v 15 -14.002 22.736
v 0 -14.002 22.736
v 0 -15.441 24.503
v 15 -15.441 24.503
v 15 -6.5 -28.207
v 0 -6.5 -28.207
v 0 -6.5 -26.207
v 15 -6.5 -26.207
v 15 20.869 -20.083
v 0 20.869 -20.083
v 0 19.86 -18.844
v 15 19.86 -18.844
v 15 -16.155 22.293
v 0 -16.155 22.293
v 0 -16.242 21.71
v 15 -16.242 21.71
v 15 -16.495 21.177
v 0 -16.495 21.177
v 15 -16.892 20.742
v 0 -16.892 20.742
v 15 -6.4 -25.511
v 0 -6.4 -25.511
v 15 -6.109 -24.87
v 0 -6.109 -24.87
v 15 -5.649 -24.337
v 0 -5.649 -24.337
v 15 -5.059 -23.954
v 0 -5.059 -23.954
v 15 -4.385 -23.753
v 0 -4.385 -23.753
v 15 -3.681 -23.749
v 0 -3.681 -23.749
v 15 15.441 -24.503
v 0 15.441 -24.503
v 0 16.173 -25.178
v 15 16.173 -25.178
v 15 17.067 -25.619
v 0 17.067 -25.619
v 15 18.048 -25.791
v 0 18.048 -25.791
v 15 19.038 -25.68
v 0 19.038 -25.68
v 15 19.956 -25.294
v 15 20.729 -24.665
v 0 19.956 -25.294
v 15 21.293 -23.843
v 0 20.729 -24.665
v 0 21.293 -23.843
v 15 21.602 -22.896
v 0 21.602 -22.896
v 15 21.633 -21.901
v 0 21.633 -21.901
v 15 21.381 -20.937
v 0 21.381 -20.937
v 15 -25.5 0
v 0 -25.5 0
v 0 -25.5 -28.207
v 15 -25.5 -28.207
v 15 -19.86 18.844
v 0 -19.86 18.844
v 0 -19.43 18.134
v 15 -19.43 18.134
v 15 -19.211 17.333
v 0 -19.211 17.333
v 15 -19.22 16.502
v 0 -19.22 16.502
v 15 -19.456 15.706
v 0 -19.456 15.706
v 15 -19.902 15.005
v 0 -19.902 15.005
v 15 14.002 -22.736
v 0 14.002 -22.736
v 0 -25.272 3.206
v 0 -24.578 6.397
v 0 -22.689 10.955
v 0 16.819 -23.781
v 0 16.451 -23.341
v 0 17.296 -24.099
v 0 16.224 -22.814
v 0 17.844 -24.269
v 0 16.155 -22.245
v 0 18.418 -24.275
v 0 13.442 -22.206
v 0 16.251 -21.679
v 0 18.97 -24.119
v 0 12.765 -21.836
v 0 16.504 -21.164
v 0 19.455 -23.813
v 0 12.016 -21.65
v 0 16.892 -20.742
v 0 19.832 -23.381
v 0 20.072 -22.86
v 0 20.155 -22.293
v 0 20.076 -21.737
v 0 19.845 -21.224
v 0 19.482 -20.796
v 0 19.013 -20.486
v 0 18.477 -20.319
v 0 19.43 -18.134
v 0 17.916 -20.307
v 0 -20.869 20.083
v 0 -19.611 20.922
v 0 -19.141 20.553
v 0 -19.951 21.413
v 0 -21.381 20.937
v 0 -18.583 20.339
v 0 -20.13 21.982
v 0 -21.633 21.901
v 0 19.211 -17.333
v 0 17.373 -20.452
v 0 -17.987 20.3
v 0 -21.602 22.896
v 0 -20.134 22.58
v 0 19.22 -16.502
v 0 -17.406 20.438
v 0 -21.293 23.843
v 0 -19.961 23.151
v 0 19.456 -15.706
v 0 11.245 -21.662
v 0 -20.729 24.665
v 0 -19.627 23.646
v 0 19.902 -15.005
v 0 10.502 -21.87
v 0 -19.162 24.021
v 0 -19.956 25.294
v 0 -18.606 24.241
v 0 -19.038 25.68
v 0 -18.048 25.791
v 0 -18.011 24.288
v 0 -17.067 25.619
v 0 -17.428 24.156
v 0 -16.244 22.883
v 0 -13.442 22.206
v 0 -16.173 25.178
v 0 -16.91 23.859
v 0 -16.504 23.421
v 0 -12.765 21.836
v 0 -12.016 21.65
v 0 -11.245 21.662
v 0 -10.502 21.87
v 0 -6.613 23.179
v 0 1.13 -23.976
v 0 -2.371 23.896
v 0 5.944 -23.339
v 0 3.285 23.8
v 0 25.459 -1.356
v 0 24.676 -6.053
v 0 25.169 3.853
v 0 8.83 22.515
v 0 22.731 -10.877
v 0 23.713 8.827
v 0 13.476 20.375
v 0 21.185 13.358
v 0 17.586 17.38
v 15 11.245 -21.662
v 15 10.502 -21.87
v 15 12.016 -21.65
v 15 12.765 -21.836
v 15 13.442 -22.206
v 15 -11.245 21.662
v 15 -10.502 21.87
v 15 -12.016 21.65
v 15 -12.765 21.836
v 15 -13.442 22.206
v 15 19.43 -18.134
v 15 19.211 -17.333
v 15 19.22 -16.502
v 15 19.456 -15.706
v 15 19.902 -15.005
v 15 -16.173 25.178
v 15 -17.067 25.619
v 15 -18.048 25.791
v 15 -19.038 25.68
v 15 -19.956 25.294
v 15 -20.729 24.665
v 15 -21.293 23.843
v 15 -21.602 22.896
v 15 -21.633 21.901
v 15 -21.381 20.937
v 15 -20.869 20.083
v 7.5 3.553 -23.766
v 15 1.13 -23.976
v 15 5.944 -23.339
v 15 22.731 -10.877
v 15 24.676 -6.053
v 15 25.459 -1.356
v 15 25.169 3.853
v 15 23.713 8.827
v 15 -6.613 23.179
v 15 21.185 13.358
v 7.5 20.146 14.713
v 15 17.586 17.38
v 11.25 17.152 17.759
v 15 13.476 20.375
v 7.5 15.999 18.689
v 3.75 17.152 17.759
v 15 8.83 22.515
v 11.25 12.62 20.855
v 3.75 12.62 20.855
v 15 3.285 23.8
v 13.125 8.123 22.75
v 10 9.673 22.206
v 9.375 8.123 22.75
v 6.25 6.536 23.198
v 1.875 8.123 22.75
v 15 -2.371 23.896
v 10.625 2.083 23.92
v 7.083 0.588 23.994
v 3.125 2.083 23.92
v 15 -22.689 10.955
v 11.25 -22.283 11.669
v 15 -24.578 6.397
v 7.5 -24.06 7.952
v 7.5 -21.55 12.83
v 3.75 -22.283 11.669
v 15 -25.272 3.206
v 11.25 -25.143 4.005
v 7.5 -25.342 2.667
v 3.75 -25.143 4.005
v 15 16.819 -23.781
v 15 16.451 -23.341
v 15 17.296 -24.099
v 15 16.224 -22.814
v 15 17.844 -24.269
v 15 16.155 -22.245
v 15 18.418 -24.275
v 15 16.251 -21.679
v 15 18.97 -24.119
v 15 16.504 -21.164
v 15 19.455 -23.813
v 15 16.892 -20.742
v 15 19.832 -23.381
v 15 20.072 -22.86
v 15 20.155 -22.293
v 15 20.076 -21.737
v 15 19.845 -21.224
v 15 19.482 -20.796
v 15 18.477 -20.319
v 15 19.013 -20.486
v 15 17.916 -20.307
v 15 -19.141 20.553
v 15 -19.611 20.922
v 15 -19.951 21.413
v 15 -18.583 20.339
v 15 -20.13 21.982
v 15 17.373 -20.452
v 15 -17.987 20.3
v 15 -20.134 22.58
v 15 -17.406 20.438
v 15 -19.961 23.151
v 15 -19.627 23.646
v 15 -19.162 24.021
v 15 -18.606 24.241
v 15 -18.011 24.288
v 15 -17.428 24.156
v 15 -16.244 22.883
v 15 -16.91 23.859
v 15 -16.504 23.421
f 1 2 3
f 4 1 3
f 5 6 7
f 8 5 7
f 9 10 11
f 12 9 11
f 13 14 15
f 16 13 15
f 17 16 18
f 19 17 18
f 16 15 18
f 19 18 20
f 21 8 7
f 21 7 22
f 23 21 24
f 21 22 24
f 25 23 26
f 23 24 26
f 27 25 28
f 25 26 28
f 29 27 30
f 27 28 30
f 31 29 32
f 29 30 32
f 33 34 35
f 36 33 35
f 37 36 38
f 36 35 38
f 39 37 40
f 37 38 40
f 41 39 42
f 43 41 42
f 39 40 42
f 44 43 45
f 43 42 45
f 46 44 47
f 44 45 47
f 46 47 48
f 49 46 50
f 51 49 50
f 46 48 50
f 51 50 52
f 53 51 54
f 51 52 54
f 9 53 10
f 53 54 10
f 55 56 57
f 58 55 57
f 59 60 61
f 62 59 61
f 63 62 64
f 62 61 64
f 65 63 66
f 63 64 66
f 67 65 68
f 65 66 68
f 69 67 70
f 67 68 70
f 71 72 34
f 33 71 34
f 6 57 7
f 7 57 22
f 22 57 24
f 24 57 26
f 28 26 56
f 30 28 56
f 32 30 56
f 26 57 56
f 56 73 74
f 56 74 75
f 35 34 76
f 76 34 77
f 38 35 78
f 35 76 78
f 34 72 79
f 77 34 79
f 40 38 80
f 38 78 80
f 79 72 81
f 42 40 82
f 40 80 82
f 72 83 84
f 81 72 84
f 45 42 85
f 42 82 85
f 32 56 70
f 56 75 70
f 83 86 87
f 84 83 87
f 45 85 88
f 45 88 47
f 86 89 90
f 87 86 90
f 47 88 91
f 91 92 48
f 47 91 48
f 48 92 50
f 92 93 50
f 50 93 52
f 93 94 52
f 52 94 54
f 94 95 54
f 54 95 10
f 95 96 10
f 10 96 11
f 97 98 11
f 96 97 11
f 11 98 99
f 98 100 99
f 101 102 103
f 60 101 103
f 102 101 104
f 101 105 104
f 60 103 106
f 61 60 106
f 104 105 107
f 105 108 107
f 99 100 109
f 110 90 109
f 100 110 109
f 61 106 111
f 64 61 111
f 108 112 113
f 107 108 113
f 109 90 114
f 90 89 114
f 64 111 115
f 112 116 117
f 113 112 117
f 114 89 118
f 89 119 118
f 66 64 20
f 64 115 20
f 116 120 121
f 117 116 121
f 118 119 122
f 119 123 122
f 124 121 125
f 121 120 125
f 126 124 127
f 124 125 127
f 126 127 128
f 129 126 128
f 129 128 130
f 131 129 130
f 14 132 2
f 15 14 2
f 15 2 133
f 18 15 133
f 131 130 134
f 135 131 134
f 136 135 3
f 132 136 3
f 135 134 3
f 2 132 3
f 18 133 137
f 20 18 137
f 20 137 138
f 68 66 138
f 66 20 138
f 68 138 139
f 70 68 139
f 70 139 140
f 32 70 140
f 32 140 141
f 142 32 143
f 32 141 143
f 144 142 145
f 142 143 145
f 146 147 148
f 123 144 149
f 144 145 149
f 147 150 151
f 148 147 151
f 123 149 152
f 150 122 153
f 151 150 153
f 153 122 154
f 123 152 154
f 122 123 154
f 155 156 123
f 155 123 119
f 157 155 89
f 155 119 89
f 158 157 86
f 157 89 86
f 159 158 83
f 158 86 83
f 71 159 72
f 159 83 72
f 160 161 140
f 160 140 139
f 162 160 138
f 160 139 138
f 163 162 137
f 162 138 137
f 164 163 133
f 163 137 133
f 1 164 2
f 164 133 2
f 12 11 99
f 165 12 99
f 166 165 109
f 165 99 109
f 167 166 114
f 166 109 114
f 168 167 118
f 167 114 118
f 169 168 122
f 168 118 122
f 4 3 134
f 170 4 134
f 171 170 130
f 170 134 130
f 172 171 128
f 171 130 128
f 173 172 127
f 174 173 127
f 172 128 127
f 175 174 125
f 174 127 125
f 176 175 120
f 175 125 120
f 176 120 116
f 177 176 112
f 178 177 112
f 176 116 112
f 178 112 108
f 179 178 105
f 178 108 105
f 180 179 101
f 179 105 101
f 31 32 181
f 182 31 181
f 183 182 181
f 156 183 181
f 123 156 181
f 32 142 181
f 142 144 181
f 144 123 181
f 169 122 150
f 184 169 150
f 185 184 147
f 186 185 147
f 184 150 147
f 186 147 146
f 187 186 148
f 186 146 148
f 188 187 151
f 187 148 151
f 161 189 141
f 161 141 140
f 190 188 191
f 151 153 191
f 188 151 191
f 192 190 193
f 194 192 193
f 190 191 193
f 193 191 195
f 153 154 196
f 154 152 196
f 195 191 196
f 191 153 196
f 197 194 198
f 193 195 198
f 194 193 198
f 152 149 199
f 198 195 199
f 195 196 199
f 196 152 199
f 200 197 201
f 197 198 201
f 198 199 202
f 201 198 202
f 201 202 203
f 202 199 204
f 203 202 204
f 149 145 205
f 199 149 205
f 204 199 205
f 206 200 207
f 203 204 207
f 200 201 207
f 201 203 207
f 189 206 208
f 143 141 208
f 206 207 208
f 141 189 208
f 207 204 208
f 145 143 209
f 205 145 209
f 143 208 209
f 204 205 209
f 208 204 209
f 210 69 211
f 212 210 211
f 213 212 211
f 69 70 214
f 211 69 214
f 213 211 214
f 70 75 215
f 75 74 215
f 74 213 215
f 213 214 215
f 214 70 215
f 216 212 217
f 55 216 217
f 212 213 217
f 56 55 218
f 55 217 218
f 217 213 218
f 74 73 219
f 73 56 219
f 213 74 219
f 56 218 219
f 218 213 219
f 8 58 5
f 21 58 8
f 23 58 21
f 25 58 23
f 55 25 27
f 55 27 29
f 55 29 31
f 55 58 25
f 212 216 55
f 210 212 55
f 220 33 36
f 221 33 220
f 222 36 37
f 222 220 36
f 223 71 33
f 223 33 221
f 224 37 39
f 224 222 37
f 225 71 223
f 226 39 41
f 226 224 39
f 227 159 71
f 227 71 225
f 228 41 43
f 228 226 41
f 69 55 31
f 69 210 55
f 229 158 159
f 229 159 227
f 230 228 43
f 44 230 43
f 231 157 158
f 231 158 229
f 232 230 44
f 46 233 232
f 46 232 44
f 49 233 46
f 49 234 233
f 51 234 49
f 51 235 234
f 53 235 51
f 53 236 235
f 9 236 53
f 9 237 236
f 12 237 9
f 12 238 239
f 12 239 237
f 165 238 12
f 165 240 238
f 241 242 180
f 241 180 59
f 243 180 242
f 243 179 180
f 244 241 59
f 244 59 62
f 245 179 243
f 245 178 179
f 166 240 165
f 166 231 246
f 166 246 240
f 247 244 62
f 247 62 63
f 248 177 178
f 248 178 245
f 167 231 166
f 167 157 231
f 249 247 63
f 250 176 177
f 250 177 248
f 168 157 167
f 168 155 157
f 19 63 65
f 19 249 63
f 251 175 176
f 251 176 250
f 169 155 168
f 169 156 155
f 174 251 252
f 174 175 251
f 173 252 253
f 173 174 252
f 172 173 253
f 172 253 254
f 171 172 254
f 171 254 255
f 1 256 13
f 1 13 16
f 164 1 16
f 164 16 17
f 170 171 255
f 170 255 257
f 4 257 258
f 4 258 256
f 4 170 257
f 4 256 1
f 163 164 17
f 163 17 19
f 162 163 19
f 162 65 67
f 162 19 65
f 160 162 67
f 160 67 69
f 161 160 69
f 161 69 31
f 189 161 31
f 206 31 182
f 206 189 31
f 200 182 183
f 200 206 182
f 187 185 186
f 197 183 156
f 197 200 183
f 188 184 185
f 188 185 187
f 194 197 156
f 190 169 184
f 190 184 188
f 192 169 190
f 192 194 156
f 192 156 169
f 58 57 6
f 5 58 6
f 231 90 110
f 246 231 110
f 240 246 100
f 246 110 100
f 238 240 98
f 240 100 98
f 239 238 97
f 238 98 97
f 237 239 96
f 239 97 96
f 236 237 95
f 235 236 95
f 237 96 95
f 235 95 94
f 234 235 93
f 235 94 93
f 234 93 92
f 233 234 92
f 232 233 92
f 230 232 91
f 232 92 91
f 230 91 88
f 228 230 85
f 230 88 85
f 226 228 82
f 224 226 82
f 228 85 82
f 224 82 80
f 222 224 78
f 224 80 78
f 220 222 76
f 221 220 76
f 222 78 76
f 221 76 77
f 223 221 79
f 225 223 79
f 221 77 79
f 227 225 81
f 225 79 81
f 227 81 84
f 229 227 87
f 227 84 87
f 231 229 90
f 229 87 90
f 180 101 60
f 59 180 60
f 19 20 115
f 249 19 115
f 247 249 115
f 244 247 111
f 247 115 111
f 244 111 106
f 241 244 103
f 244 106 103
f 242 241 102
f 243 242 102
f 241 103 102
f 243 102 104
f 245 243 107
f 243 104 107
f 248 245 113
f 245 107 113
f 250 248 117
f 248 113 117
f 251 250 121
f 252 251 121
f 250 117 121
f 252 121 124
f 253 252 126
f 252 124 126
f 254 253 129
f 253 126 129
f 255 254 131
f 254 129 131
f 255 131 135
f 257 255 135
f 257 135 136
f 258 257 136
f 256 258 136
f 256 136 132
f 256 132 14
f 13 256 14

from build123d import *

# Parameters (mm, degrees)
F1_DEPTH = 15


with BuildPart() as f1:
    # F0 (on Right) → F1 (new body)
    with BuildSketch(Plane.YZ):
        with BuildLine():
            ThreePointArc((-6.5, -26.2072056582), (-5.6494517179, -24.3369017185), (-3.6808400649, -23.7486523094))
            add(Edge.make_bspline(
                [(-3.6808400649, -23.7486523094), (3.702462975, -24.7623321152), (10.5017708959, -21.8702115954)],
                knots=[4.5675362851, 4.5675362851, 4.5675362851, 5.1368548975, 5.1368548975, 5.1368548975], degree=2, weights=[1, 0.9597573856, 1]))
            ThreePointArc((10.5017708959, -21.8702115954), (12.3966749561, -21.7186938586), (14.0022277918, -22.736445849))
            Line((14.0022277918, -22.736445849), (15.4408135596, -24.502934041))
            ThreePointArc((15.4408135596, -24.502934041), (20.364858657, -25.0066997399), (20.8686243559, -20.0826546426))
            Line((20.8686243559, -20.0826546426), (19.8598903656, -18.8439960082))
            ThreePointArc((19.8598903656, -18.8439960082), (19.1862718938, -16.9170117814), (19.9015815348, -15.005111634))
            add(Edge.make_bspline(
                [(19.9015815348, -15.005111634), (32.4719972623, -0.2364846057), (20.1459131328, 14.7134567688), (7.8198290034, 29.6633981433), (-10.5017708959, 21.8702115954)],
                knots=[5.6077809056, 5.6077809056, 5.6077809056, 6.9431142283, 6.9431142283, 8.2784475511, 8.2784475511, 8.2784475511], degree=2, weights=[1, 0.7852685014, 1, 0.7852685014, 1]))
            ThreePointArc((-10.5017708959, 21.8702115954), (-12.3966749561, 21.7186938586), (-14.0022277918, 22.736445849))
            Line((-14.0022277918, 22.736445849), (-15.4408135596, 24.502934041))
            ThreePointArc((-15.4408135596, 24.502934041), (-20.364858657, 25.0066997399), (-20.8686243559, 20.0826546426))
            Line((-20.8686243559, 20.0826546426), (-19.8598903656, 18.8439960082))
            ThreePointArc((-19.8598903656, 18.8439960082), (-19.1862718938, 16.9170117814), (-19.9015815348, 15.005111634))
            add(Edge.make_bspline(
                [(-19.9015815348, 15.005111634), (-25.5, 8.4276876209), (-25.5, 0)],
                knots=[2.466188252, 2.466188252, 2.466188252, 3.1415926536, 3.1415926536, 3.1415926536], degree=2, weights=[1, 0.9435184624, 1]))
            Line((-25.5, 0), (-25.5, -28.2072056582))
            Line((-25.5, -28.2072056582), (-6.5, -28.2072056582))
            Line((-6.5, -28.2072056582), (-6.5, -26.2072056582))
        make_face()
        with BuildLine():
            ThreePointArc((16.8917819868, -20.7419912571), (19.0132427076, -20.4864341974), (20.1547189578, -22.2927943418))
            ThreePointArc((20.1547189578, -22.2927943418), (17.2961952079, -24.0991544861), (16.8917819868, -20.7419912571))
        make_face(mode=Mode.SUBTRACT)
        with BuildLine():
            ThreePointArc((-16.8917819868, 20.7419912571), (-19.9610791021, 23.1513180916), (-16.1547189578, 22.2927943418))
            ThreePointArc((-16.1547189578, 22.2927943418), (-16.3483588135, 21.4342705919), (-16.8917819868, 20.7419912571))
        make_face(mode=Mode.SUBTRACT)
    extrude(amount=F1_DEPTH)


solid = f1.part
